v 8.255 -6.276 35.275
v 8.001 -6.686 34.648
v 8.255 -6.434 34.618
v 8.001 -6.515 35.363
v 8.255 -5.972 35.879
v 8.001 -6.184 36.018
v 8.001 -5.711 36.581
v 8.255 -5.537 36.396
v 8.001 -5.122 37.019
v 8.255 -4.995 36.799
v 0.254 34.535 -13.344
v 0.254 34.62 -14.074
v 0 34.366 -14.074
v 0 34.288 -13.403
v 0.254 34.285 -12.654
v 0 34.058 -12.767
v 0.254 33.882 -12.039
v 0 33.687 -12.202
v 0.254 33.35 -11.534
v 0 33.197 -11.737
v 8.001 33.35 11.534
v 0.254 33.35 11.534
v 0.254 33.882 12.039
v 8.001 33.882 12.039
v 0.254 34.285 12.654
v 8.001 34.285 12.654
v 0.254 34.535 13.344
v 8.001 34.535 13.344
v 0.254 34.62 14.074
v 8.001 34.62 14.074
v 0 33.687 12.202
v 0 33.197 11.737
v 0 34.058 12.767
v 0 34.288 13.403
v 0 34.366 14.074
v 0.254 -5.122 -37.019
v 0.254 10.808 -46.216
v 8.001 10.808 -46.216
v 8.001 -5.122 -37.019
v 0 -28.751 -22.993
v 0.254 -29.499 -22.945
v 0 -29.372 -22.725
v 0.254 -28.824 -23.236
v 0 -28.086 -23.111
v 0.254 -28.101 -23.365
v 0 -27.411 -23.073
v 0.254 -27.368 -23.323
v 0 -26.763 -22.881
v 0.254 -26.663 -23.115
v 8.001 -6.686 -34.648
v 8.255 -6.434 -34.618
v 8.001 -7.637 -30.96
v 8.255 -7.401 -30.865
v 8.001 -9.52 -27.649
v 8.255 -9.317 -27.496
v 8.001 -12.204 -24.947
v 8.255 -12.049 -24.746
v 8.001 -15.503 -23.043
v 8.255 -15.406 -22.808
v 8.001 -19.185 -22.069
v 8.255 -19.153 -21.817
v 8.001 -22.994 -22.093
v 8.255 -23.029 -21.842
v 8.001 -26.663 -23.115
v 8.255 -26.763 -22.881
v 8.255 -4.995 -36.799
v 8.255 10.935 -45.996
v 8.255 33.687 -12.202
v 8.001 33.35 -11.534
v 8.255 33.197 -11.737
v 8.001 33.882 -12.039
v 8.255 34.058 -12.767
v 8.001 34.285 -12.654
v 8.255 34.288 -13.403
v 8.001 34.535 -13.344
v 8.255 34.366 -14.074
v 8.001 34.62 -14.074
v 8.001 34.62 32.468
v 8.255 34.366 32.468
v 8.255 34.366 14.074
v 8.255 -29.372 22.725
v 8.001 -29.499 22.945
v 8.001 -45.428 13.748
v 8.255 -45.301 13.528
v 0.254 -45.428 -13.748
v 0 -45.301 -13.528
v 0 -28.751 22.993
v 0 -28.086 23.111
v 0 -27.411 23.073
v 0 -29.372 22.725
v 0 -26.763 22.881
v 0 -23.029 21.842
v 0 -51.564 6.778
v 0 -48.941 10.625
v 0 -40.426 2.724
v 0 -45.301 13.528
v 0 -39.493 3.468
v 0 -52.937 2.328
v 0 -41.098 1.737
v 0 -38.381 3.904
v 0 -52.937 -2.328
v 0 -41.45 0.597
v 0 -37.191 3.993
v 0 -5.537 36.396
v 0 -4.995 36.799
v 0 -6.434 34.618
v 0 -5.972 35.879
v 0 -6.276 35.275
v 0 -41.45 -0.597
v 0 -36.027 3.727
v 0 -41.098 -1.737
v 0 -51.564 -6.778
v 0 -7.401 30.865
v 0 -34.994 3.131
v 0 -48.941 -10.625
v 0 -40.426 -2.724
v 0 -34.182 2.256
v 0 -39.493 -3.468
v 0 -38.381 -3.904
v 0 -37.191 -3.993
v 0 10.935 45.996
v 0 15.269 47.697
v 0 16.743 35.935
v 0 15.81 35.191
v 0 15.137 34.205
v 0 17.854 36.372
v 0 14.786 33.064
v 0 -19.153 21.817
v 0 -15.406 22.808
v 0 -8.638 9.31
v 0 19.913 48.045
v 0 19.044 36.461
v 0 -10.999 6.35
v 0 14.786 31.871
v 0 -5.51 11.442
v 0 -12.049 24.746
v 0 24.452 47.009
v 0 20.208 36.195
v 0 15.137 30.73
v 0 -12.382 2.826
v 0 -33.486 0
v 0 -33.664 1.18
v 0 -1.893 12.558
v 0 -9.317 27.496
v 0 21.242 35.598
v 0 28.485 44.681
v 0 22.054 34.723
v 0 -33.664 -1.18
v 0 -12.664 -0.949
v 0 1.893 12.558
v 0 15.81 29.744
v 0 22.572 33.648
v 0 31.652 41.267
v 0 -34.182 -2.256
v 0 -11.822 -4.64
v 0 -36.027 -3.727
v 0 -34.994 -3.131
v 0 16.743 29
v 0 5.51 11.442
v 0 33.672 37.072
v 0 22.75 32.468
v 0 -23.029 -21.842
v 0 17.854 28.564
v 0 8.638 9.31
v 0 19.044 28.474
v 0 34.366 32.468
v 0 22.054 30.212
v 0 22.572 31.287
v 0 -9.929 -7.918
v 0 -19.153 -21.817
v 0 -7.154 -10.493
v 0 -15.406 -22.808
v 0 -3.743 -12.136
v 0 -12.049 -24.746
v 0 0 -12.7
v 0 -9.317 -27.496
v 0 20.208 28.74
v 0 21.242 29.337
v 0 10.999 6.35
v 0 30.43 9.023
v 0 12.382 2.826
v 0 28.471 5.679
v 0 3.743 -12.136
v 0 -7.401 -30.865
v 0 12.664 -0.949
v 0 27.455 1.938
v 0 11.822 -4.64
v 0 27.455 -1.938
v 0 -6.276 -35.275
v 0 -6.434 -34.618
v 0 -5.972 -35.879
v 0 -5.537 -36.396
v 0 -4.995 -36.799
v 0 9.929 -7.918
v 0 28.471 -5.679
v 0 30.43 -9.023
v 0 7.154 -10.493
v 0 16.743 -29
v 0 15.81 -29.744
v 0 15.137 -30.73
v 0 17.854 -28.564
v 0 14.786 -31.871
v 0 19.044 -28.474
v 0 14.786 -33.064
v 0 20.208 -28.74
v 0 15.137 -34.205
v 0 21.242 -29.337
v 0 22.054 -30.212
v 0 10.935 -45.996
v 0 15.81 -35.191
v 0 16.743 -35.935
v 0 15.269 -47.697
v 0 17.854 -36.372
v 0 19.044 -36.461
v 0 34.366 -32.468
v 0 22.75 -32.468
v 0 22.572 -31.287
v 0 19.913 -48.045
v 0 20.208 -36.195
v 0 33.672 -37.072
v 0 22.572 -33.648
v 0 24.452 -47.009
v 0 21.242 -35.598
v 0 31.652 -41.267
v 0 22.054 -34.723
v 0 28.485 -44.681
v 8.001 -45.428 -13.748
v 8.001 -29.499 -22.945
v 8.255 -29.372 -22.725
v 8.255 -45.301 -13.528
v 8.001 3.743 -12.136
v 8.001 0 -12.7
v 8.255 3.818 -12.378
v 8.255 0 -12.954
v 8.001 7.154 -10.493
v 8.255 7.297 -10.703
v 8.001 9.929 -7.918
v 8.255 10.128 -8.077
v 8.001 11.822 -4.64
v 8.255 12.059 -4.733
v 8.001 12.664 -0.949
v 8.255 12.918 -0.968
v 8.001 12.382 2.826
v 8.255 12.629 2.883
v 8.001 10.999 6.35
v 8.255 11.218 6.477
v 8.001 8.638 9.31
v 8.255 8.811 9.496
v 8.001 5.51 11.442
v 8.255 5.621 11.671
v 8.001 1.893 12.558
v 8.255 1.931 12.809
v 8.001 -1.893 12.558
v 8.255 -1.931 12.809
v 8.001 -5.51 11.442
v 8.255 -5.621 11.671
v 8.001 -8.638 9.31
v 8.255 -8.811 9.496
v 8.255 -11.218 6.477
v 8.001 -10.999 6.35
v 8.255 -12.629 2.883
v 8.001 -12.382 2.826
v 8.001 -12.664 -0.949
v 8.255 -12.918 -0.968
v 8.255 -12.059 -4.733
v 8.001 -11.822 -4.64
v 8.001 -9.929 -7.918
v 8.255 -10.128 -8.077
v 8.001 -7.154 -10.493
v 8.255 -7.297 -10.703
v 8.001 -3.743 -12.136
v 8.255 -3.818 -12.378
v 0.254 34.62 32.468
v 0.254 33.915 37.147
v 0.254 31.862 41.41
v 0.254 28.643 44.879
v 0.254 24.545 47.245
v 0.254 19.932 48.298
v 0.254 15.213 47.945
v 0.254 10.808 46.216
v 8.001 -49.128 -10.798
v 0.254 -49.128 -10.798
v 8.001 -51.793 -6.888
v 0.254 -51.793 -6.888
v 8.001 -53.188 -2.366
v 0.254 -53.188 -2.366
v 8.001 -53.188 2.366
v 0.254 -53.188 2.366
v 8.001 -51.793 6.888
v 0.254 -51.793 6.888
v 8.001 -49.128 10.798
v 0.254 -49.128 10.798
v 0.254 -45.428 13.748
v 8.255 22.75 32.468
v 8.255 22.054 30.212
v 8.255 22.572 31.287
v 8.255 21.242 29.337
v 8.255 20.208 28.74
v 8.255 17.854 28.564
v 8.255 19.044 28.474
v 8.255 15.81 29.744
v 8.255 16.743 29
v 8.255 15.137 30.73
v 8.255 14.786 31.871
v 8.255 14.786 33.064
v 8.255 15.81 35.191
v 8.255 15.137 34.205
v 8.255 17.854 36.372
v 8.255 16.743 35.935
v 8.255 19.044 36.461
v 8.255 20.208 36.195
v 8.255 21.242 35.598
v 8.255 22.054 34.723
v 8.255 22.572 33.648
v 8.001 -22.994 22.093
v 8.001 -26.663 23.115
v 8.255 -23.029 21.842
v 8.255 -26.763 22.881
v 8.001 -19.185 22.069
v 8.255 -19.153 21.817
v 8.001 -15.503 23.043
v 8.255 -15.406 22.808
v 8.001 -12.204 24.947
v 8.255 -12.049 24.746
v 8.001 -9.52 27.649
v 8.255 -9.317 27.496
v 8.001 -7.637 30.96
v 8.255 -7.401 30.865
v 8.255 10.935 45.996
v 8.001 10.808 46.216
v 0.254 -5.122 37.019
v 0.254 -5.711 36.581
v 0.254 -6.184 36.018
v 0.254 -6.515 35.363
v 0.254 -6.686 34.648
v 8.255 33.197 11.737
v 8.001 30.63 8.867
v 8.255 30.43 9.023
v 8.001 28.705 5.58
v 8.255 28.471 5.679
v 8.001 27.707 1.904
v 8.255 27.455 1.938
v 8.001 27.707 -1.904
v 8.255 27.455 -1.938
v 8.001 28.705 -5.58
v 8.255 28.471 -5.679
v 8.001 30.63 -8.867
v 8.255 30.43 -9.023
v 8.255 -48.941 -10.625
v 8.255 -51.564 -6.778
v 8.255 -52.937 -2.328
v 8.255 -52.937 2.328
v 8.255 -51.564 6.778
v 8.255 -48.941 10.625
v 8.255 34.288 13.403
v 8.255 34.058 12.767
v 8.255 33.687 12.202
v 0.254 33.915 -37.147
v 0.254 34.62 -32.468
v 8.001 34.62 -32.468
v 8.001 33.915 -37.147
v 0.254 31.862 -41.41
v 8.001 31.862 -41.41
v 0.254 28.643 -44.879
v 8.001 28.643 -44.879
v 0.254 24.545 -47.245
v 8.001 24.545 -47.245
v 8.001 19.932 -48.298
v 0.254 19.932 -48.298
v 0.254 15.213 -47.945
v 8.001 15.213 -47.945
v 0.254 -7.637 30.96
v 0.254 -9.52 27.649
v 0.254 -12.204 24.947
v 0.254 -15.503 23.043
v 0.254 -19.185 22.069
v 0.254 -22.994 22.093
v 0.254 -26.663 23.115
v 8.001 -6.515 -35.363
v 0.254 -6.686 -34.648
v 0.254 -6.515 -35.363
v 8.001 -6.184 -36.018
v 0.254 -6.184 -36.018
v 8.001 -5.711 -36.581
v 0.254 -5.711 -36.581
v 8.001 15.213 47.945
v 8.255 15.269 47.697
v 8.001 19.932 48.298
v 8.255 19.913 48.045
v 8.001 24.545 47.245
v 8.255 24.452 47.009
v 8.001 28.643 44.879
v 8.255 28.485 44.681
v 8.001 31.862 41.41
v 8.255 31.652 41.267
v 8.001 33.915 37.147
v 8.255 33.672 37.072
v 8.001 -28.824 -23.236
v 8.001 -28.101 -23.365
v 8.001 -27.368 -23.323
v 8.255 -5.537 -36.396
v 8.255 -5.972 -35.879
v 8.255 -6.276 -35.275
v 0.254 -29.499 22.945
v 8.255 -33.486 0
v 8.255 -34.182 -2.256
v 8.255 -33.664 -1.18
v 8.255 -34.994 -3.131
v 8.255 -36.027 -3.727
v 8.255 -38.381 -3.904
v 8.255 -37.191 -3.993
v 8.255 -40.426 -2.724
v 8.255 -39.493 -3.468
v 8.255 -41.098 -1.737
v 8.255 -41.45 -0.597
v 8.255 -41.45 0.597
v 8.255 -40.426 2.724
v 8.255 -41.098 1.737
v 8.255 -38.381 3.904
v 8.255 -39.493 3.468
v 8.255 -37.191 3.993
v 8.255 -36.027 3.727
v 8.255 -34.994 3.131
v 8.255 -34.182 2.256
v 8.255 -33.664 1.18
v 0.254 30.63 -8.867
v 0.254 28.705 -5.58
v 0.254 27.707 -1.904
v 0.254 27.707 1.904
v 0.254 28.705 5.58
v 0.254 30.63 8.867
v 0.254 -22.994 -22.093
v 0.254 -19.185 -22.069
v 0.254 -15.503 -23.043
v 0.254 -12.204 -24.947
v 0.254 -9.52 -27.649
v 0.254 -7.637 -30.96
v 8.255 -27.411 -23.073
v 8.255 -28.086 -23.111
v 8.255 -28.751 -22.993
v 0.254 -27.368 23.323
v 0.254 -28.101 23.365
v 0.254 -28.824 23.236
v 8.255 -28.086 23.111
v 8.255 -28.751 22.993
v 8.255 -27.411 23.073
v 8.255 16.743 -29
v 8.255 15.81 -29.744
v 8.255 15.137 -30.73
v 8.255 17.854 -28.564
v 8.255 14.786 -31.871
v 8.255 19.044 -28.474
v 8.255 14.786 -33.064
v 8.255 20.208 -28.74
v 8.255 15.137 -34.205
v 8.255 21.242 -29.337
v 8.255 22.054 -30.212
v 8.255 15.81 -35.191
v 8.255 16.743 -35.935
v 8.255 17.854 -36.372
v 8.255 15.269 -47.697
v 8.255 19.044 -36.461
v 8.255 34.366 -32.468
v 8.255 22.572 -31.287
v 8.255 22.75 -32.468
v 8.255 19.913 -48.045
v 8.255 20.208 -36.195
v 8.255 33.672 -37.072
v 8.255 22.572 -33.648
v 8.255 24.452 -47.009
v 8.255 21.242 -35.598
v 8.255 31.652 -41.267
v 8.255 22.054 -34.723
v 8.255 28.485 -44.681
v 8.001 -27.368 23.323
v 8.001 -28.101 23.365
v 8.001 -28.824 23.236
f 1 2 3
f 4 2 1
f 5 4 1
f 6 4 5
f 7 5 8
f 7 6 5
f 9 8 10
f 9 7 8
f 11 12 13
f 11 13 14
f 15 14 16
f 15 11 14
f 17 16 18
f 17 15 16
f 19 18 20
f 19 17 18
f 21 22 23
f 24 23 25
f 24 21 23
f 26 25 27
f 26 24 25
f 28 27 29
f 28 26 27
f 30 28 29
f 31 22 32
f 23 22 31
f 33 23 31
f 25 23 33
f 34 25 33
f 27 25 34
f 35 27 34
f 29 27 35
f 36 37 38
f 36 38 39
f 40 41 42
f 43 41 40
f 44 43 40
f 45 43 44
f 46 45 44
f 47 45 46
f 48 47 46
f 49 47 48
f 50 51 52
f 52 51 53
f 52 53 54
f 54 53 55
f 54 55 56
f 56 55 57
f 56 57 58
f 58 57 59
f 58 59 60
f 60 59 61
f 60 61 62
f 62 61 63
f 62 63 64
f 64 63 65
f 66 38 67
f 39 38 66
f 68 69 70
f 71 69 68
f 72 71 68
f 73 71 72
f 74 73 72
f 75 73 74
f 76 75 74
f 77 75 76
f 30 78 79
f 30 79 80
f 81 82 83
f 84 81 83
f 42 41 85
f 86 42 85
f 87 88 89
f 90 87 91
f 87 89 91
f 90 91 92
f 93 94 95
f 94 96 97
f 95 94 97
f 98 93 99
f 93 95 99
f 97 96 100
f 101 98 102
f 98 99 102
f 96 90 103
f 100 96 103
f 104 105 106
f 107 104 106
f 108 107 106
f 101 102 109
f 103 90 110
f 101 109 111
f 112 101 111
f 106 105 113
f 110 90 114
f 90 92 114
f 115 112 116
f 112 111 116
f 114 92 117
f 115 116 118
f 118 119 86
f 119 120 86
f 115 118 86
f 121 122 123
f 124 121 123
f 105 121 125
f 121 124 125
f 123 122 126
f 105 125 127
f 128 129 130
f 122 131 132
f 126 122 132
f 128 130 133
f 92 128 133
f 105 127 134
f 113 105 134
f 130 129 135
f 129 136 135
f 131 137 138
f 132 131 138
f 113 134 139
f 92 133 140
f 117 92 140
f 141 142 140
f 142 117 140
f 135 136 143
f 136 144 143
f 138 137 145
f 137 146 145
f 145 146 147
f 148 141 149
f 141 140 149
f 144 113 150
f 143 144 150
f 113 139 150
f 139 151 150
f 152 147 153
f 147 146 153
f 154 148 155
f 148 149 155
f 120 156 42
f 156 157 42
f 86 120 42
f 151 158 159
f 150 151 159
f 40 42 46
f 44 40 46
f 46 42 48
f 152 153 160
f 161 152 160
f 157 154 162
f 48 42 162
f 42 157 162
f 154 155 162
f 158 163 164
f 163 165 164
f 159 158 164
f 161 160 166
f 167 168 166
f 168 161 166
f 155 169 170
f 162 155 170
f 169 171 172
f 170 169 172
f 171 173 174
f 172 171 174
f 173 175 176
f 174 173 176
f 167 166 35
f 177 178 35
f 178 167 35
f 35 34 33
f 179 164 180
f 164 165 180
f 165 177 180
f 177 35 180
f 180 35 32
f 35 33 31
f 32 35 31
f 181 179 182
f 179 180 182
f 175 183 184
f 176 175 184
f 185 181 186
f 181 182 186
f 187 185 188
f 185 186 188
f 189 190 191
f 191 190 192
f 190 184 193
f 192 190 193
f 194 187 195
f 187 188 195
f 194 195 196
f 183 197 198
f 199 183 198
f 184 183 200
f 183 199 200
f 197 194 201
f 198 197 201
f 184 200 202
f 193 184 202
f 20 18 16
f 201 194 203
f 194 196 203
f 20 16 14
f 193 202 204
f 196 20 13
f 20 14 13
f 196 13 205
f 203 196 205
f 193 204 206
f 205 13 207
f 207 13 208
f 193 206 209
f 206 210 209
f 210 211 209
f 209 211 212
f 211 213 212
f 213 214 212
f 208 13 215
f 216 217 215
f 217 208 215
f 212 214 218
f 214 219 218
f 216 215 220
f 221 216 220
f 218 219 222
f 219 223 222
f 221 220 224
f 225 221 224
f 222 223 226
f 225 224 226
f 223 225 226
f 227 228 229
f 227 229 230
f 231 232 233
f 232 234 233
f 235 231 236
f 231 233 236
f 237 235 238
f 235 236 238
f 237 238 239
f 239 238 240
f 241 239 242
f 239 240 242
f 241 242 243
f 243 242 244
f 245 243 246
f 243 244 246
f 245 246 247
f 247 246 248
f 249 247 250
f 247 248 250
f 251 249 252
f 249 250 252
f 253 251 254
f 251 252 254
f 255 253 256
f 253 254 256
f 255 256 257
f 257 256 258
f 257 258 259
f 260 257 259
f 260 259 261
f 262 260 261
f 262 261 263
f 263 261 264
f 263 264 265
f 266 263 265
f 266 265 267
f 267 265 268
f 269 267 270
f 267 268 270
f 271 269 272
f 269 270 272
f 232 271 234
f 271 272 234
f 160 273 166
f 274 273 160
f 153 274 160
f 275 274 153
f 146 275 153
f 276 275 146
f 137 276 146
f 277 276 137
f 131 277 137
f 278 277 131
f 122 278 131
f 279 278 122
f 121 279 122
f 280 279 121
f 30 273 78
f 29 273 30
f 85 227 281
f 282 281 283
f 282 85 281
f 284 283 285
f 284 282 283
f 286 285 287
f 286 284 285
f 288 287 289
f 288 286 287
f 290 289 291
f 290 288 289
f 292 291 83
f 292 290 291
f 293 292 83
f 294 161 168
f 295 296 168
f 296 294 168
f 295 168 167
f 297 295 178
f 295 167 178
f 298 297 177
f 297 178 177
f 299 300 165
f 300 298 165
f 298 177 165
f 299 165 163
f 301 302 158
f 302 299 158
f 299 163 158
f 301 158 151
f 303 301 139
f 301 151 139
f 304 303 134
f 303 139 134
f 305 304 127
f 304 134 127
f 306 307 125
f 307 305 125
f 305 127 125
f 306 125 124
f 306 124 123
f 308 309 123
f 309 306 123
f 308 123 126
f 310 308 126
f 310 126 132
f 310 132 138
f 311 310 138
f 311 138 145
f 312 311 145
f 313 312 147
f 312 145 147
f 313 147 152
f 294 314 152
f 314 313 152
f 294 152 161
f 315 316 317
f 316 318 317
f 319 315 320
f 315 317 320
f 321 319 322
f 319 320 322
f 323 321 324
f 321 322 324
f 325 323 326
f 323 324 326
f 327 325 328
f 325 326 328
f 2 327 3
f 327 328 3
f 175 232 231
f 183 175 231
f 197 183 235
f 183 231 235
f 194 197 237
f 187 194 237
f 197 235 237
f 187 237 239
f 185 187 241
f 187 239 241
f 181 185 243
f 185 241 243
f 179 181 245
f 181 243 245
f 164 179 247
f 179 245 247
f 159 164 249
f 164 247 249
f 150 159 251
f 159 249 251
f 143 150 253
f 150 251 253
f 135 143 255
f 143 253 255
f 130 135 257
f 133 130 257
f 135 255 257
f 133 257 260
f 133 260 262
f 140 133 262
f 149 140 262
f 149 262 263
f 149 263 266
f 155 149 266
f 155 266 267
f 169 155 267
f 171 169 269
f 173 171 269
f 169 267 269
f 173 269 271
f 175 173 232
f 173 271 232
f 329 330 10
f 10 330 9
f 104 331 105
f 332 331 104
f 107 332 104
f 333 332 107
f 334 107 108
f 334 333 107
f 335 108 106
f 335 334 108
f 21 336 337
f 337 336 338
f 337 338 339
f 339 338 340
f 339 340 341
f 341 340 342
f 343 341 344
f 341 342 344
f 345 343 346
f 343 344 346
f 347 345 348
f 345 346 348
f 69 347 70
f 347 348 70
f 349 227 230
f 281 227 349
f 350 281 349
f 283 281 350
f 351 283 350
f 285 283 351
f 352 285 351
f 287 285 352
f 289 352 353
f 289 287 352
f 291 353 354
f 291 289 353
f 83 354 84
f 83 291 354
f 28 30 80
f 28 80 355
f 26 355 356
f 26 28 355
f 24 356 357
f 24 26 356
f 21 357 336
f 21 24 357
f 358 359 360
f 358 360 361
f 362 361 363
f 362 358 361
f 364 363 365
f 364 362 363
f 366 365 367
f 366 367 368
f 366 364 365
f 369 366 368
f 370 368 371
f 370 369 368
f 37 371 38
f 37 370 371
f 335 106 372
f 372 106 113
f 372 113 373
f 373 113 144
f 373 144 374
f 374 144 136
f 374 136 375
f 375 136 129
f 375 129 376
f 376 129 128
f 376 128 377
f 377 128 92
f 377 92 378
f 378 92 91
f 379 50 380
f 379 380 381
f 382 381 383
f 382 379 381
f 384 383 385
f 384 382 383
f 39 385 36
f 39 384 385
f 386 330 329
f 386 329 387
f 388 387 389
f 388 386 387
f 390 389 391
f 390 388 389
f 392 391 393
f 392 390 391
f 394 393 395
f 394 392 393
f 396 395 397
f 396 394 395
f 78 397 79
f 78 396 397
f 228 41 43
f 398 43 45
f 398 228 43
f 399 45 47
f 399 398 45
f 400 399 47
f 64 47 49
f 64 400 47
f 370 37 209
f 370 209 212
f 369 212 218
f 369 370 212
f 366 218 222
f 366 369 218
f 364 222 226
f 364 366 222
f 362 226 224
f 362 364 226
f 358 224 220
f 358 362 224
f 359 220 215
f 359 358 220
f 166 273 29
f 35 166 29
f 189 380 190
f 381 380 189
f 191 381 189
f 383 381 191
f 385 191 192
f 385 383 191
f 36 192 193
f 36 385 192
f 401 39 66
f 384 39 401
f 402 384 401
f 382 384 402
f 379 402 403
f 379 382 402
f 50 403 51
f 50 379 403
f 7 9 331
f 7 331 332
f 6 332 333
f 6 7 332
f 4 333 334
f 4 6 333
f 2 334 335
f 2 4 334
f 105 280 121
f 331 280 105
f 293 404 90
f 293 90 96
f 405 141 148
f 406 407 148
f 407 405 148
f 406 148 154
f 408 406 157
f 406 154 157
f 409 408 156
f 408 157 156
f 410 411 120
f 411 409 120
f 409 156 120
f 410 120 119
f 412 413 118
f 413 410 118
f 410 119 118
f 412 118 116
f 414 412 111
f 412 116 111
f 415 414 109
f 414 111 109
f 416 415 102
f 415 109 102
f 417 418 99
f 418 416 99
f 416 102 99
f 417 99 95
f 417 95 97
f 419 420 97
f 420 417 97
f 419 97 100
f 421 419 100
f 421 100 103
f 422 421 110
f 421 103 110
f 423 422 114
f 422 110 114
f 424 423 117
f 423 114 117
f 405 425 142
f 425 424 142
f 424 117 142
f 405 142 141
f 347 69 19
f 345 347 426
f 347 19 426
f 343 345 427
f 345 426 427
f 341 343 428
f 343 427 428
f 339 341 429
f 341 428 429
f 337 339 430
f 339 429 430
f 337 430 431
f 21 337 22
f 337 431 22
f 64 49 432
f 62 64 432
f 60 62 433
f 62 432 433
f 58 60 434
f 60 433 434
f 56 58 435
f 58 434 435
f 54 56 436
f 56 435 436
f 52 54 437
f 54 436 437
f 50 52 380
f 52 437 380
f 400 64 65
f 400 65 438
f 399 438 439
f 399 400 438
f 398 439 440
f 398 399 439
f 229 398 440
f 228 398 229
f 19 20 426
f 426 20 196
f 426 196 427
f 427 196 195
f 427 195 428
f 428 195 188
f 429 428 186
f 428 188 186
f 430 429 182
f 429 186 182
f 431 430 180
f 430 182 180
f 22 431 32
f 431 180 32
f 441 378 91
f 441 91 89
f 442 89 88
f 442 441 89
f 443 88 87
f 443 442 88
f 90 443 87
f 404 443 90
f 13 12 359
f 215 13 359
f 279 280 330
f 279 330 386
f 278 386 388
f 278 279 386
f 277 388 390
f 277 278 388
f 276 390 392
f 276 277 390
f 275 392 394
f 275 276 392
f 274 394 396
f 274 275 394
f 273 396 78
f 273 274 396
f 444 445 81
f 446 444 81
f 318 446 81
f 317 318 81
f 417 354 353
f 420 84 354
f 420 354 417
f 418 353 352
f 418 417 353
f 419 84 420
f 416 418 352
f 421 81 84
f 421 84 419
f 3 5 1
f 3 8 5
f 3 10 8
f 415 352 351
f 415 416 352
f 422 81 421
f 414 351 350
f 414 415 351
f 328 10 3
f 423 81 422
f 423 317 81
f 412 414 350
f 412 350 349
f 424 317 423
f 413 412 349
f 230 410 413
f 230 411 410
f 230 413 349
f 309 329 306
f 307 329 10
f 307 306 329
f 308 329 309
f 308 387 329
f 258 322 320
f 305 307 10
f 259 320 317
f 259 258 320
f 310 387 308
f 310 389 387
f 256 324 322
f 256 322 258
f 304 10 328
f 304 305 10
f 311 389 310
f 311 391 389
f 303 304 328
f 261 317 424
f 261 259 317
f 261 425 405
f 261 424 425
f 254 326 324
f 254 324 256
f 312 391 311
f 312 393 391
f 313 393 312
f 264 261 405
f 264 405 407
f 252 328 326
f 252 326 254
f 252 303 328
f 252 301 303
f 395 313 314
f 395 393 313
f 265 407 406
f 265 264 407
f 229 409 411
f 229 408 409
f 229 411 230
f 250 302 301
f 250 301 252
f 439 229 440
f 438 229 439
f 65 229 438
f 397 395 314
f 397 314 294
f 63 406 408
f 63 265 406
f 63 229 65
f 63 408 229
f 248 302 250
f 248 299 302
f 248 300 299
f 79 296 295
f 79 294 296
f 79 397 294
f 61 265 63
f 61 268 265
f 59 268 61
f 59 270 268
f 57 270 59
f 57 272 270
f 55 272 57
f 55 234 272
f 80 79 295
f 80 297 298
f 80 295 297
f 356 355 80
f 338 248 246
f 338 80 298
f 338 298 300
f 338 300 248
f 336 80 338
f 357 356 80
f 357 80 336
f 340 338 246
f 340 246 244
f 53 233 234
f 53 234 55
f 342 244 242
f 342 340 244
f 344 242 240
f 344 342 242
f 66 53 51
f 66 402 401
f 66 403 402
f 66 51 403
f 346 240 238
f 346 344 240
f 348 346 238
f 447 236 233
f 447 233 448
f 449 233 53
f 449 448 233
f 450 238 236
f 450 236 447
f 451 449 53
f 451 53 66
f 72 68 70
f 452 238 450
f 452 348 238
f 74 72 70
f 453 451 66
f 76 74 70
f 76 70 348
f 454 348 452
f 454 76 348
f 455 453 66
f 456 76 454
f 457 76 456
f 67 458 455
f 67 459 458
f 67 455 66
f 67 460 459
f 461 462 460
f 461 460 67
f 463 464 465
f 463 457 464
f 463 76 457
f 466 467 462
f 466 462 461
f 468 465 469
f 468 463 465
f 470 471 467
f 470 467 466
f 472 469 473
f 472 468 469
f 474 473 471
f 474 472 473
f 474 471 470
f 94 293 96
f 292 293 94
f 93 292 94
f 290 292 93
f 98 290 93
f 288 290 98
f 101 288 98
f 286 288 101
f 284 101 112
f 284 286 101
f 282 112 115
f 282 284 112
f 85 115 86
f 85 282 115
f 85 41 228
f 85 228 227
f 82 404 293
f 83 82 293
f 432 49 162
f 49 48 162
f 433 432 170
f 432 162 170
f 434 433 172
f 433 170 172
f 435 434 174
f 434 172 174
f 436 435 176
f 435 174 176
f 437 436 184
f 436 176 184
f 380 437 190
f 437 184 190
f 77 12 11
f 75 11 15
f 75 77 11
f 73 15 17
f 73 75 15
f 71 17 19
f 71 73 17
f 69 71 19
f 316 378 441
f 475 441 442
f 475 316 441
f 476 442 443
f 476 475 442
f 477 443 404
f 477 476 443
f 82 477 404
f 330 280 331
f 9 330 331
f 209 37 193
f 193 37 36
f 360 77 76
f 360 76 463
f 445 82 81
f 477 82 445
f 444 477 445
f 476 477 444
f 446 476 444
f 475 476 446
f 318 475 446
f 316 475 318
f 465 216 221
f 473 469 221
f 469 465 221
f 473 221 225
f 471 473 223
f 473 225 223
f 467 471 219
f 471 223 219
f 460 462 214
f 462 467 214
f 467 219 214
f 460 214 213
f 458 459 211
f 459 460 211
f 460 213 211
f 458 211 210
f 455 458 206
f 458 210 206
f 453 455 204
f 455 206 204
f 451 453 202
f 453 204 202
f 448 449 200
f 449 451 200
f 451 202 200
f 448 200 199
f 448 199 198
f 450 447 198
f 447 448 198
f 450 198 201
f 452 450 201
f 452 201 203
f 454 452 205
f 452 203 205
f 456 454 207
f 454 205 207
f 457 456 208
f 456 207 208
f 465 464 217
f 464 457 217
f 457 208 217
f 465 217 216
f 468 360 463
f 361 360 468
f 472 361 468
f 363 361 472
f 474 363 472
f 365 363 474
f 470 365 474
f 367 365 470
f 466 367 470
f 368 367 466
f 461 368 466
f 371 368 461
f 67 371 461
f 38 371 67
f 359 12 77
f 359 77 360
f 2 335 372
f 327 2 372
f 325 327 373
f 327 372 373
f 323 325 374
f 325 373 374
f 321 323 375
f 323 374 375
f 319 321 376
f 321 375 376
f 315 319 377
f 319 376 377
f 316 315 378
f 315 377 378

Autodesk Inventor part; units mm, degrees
ref_plane "YZ Plane" through (0, 0, 0) normal (1, 0, 0) x (0, 1, 0)
ref_plane "XZ Plane" through (0, 0, 0) normal (0, 1, 0) x (-1, 0, 0)
ref_plane "XY Plane" through (0, 0, 0) normal (0, 0, 1) x (1, 0, 0)
sketch "Sketch1" plane through (0, 0, 0) normal (1, 0, 0) x (0, 1, 0)
  circle A0 centre (0, 0) radius 15.875
  circle A1 centre (18.7452, -32.4676) radius 4.0043
  circle A2 centre (18.7452, -32.4676) radius 15.875
  circle A3 centre (-37.4904, 0) radius 4.0043
  circle A4 centre (-37.4904, 0) radius 15.875
  circle A5 centre (18.7452, 32.4676) radius 15.875
  circle A6 centre (18.7452, 32.4676) radius 4.0043
  circle A7 centre (18.7452, -32.4676) radius 4.0043
  circle A8 centre (18.7452, -32.4676) radius 15.875
  circle A9 centre (0, 0) radius 15.875
  circle A10 centre (-37.4904, 0) radius 4.0043
  circle A11 centre (-37.4904, 0) radius 15.875
  circle A12 centre (18.7452, 32.4676) radius 4.0043
  circle A13 centre (18.7452, 32.4676) radius 15.875
  line L0 (34.6202, 32.4676) -> (34.6202, -32.4676)
  line L1 (10.8077, -46.2158) -> (-45.4279, -13.7482)
  line L2 (10.8077, 46.2158) -> (-45.4279, 13.7482)
  circle A14 centre (18.7452, 32.4676) radius 15.875
  circle A15 centre (-37.4904, 0) radius 15.875
  circle A16 centre (18.7452, -32.4676) radius 15.875
  circle A17 centre (41.995, 0) radius 14.4142
  circle A18 centre (-20.9975, 36.3687) radius 14.4142
  circle A19 centre (-20.9975, -36.3687) radius 14.4142
  point P0 (-28.0356, -23.7896)
  point P1 (-6.5846, -36.1743)
  point P2 (10.8077, -46.2158)
  point P3 (34.6202, -12.3847)
  point P4 (34.6202, 12.3847)
  point P5 (-6.5846, 36.1743)
  point P6 (-28.0356, 23.7896)
  point P7 (-45.4279, 13.7482)
  point P8 (-45.4279, -13.7482)
  dimension "d28" = 360
  dimension "d34" = 31.75
  dimension "d35" = 28.8284
  dimension "d36" = 8.0086
  dimension "d37" = 31.75
  dimension "d38" = 31.75
  dimension "d39" = 60
  dimension "d40" = 60
  dimension "d41" = 7.3748
  dimension "d42" = 55.6177
  dimension "d43" = 55.6177
  dimension "d44" = 0
  dimension "d45" = 41.2048
  dimension "d46" = 0
  dimension "d47" = 62.6558
  dimension "d48" = 80.0481
  dimension "d49" = 0
  dimension "d50" = 80.0481
  dimension "d51" = 15.875
  dimension "d52" = 15.875
  dimension "d53" = 23.8125
  dimension "d54" = 80.0481
  dimension "d55" = 34.6202
  dimension "d56" = 34.6202
  dimension "d57" = 41.2048
  dimension "d58" = 0
  dimension "d59" = 41.2048
  dimension "d60" = 62.6558
  dimension "d61" = 62.6558
  dimension "d62" = 0
  dimension "d63" = 62.6558
  dimension "d64" = 41.2048
  dimension "d65" = 72.1106
  dimension "d66" = 80.0481
  dimension "d67" = 0
  dimension "d68" = 80.0481
  dimension "d69" = 23.8125
extrude "Extrusion1" add sketch "Sketch1" along normal blind 8.255 contours A2 | A2 L1 A19 A4 L2 A18 A5 L0 A17 | A5 | A4
fillet "Fillet2" radius 3.175 6 edges at (4.1275, 34.6202, 12.3847) (4.1275, 34.6202, -12.3847) (4.1275, -6.5846, 36.1743) (4.1275, -28.0356, 23.7896) (4.1275, -6.5846, -36.1743) (4.1275, -28.0356, -23.7896)
sketch "Sketch5" plane through (8.255, 0, 0) normal (1, 0, 0) x (0, 0, -1)
  circle A0 centre (0, 0) radius 15.875
  circle A1 centre (0, 0) radius 12.7
  dimension "d70" = 25.4
extrude "Extrusion3" add sketch "Sketch5" against normal up to surface (8.255 mm away)
chamfer "Chamfer4" distance 0.254 angle 45 37 edges at (8.255, 2.8431, -41.6174) (8.255, 26.6827, -46.2158) (8.255, 34.6202, -23.2709) (8.255, 34.2848, -12.6539) (8.255, 27.5808, 0) (8.255, 34.2848, 12.6539) (8.255, 34.6202, 23.2709) (8.255, 26.6827, 46.2158) (8.255, 2.8431, 41.6174) (8.255, -6.1838, 36.0185) (8.255, -13.7904, 23.8857) (8.255, -28.101, 23.3646) (8.255, -37.4633, 18.3465) (8.255, -53.3654, 0) (8.255, -37.4633, -18.3465) (8.255, -28.101, -23.3646) (8.255, -13.7904, -23.8857) (8.255, -6.1838, -36.0185) (8.255, 0, 12.7) (0, 2.8431, 41.6174) (0, -6.1838, 36.0185) (0, -13.7904, 23.8857) (0, -28.101, 23.3646) (0, -37.4633, 18.3465) (0, -53.3654, 0) (0, -37.4633, -18.3465) (0, -28.101, -23.3646) (0, -13.7904, -23.8857) (0, -6.1838, -36.0185) (0, 2.8431, -41.6174) (0, 26.6827, -46.2158) (0, 34.6202, -23.2709) (0, 34.2848, -12.6539) (0, 27.5808, 0) (0, 34.2848, 12.6539) (0, 34.6202, 23.2709) (0, 26.6827, 46.2158)
properties part number "Torque_Triangle"
